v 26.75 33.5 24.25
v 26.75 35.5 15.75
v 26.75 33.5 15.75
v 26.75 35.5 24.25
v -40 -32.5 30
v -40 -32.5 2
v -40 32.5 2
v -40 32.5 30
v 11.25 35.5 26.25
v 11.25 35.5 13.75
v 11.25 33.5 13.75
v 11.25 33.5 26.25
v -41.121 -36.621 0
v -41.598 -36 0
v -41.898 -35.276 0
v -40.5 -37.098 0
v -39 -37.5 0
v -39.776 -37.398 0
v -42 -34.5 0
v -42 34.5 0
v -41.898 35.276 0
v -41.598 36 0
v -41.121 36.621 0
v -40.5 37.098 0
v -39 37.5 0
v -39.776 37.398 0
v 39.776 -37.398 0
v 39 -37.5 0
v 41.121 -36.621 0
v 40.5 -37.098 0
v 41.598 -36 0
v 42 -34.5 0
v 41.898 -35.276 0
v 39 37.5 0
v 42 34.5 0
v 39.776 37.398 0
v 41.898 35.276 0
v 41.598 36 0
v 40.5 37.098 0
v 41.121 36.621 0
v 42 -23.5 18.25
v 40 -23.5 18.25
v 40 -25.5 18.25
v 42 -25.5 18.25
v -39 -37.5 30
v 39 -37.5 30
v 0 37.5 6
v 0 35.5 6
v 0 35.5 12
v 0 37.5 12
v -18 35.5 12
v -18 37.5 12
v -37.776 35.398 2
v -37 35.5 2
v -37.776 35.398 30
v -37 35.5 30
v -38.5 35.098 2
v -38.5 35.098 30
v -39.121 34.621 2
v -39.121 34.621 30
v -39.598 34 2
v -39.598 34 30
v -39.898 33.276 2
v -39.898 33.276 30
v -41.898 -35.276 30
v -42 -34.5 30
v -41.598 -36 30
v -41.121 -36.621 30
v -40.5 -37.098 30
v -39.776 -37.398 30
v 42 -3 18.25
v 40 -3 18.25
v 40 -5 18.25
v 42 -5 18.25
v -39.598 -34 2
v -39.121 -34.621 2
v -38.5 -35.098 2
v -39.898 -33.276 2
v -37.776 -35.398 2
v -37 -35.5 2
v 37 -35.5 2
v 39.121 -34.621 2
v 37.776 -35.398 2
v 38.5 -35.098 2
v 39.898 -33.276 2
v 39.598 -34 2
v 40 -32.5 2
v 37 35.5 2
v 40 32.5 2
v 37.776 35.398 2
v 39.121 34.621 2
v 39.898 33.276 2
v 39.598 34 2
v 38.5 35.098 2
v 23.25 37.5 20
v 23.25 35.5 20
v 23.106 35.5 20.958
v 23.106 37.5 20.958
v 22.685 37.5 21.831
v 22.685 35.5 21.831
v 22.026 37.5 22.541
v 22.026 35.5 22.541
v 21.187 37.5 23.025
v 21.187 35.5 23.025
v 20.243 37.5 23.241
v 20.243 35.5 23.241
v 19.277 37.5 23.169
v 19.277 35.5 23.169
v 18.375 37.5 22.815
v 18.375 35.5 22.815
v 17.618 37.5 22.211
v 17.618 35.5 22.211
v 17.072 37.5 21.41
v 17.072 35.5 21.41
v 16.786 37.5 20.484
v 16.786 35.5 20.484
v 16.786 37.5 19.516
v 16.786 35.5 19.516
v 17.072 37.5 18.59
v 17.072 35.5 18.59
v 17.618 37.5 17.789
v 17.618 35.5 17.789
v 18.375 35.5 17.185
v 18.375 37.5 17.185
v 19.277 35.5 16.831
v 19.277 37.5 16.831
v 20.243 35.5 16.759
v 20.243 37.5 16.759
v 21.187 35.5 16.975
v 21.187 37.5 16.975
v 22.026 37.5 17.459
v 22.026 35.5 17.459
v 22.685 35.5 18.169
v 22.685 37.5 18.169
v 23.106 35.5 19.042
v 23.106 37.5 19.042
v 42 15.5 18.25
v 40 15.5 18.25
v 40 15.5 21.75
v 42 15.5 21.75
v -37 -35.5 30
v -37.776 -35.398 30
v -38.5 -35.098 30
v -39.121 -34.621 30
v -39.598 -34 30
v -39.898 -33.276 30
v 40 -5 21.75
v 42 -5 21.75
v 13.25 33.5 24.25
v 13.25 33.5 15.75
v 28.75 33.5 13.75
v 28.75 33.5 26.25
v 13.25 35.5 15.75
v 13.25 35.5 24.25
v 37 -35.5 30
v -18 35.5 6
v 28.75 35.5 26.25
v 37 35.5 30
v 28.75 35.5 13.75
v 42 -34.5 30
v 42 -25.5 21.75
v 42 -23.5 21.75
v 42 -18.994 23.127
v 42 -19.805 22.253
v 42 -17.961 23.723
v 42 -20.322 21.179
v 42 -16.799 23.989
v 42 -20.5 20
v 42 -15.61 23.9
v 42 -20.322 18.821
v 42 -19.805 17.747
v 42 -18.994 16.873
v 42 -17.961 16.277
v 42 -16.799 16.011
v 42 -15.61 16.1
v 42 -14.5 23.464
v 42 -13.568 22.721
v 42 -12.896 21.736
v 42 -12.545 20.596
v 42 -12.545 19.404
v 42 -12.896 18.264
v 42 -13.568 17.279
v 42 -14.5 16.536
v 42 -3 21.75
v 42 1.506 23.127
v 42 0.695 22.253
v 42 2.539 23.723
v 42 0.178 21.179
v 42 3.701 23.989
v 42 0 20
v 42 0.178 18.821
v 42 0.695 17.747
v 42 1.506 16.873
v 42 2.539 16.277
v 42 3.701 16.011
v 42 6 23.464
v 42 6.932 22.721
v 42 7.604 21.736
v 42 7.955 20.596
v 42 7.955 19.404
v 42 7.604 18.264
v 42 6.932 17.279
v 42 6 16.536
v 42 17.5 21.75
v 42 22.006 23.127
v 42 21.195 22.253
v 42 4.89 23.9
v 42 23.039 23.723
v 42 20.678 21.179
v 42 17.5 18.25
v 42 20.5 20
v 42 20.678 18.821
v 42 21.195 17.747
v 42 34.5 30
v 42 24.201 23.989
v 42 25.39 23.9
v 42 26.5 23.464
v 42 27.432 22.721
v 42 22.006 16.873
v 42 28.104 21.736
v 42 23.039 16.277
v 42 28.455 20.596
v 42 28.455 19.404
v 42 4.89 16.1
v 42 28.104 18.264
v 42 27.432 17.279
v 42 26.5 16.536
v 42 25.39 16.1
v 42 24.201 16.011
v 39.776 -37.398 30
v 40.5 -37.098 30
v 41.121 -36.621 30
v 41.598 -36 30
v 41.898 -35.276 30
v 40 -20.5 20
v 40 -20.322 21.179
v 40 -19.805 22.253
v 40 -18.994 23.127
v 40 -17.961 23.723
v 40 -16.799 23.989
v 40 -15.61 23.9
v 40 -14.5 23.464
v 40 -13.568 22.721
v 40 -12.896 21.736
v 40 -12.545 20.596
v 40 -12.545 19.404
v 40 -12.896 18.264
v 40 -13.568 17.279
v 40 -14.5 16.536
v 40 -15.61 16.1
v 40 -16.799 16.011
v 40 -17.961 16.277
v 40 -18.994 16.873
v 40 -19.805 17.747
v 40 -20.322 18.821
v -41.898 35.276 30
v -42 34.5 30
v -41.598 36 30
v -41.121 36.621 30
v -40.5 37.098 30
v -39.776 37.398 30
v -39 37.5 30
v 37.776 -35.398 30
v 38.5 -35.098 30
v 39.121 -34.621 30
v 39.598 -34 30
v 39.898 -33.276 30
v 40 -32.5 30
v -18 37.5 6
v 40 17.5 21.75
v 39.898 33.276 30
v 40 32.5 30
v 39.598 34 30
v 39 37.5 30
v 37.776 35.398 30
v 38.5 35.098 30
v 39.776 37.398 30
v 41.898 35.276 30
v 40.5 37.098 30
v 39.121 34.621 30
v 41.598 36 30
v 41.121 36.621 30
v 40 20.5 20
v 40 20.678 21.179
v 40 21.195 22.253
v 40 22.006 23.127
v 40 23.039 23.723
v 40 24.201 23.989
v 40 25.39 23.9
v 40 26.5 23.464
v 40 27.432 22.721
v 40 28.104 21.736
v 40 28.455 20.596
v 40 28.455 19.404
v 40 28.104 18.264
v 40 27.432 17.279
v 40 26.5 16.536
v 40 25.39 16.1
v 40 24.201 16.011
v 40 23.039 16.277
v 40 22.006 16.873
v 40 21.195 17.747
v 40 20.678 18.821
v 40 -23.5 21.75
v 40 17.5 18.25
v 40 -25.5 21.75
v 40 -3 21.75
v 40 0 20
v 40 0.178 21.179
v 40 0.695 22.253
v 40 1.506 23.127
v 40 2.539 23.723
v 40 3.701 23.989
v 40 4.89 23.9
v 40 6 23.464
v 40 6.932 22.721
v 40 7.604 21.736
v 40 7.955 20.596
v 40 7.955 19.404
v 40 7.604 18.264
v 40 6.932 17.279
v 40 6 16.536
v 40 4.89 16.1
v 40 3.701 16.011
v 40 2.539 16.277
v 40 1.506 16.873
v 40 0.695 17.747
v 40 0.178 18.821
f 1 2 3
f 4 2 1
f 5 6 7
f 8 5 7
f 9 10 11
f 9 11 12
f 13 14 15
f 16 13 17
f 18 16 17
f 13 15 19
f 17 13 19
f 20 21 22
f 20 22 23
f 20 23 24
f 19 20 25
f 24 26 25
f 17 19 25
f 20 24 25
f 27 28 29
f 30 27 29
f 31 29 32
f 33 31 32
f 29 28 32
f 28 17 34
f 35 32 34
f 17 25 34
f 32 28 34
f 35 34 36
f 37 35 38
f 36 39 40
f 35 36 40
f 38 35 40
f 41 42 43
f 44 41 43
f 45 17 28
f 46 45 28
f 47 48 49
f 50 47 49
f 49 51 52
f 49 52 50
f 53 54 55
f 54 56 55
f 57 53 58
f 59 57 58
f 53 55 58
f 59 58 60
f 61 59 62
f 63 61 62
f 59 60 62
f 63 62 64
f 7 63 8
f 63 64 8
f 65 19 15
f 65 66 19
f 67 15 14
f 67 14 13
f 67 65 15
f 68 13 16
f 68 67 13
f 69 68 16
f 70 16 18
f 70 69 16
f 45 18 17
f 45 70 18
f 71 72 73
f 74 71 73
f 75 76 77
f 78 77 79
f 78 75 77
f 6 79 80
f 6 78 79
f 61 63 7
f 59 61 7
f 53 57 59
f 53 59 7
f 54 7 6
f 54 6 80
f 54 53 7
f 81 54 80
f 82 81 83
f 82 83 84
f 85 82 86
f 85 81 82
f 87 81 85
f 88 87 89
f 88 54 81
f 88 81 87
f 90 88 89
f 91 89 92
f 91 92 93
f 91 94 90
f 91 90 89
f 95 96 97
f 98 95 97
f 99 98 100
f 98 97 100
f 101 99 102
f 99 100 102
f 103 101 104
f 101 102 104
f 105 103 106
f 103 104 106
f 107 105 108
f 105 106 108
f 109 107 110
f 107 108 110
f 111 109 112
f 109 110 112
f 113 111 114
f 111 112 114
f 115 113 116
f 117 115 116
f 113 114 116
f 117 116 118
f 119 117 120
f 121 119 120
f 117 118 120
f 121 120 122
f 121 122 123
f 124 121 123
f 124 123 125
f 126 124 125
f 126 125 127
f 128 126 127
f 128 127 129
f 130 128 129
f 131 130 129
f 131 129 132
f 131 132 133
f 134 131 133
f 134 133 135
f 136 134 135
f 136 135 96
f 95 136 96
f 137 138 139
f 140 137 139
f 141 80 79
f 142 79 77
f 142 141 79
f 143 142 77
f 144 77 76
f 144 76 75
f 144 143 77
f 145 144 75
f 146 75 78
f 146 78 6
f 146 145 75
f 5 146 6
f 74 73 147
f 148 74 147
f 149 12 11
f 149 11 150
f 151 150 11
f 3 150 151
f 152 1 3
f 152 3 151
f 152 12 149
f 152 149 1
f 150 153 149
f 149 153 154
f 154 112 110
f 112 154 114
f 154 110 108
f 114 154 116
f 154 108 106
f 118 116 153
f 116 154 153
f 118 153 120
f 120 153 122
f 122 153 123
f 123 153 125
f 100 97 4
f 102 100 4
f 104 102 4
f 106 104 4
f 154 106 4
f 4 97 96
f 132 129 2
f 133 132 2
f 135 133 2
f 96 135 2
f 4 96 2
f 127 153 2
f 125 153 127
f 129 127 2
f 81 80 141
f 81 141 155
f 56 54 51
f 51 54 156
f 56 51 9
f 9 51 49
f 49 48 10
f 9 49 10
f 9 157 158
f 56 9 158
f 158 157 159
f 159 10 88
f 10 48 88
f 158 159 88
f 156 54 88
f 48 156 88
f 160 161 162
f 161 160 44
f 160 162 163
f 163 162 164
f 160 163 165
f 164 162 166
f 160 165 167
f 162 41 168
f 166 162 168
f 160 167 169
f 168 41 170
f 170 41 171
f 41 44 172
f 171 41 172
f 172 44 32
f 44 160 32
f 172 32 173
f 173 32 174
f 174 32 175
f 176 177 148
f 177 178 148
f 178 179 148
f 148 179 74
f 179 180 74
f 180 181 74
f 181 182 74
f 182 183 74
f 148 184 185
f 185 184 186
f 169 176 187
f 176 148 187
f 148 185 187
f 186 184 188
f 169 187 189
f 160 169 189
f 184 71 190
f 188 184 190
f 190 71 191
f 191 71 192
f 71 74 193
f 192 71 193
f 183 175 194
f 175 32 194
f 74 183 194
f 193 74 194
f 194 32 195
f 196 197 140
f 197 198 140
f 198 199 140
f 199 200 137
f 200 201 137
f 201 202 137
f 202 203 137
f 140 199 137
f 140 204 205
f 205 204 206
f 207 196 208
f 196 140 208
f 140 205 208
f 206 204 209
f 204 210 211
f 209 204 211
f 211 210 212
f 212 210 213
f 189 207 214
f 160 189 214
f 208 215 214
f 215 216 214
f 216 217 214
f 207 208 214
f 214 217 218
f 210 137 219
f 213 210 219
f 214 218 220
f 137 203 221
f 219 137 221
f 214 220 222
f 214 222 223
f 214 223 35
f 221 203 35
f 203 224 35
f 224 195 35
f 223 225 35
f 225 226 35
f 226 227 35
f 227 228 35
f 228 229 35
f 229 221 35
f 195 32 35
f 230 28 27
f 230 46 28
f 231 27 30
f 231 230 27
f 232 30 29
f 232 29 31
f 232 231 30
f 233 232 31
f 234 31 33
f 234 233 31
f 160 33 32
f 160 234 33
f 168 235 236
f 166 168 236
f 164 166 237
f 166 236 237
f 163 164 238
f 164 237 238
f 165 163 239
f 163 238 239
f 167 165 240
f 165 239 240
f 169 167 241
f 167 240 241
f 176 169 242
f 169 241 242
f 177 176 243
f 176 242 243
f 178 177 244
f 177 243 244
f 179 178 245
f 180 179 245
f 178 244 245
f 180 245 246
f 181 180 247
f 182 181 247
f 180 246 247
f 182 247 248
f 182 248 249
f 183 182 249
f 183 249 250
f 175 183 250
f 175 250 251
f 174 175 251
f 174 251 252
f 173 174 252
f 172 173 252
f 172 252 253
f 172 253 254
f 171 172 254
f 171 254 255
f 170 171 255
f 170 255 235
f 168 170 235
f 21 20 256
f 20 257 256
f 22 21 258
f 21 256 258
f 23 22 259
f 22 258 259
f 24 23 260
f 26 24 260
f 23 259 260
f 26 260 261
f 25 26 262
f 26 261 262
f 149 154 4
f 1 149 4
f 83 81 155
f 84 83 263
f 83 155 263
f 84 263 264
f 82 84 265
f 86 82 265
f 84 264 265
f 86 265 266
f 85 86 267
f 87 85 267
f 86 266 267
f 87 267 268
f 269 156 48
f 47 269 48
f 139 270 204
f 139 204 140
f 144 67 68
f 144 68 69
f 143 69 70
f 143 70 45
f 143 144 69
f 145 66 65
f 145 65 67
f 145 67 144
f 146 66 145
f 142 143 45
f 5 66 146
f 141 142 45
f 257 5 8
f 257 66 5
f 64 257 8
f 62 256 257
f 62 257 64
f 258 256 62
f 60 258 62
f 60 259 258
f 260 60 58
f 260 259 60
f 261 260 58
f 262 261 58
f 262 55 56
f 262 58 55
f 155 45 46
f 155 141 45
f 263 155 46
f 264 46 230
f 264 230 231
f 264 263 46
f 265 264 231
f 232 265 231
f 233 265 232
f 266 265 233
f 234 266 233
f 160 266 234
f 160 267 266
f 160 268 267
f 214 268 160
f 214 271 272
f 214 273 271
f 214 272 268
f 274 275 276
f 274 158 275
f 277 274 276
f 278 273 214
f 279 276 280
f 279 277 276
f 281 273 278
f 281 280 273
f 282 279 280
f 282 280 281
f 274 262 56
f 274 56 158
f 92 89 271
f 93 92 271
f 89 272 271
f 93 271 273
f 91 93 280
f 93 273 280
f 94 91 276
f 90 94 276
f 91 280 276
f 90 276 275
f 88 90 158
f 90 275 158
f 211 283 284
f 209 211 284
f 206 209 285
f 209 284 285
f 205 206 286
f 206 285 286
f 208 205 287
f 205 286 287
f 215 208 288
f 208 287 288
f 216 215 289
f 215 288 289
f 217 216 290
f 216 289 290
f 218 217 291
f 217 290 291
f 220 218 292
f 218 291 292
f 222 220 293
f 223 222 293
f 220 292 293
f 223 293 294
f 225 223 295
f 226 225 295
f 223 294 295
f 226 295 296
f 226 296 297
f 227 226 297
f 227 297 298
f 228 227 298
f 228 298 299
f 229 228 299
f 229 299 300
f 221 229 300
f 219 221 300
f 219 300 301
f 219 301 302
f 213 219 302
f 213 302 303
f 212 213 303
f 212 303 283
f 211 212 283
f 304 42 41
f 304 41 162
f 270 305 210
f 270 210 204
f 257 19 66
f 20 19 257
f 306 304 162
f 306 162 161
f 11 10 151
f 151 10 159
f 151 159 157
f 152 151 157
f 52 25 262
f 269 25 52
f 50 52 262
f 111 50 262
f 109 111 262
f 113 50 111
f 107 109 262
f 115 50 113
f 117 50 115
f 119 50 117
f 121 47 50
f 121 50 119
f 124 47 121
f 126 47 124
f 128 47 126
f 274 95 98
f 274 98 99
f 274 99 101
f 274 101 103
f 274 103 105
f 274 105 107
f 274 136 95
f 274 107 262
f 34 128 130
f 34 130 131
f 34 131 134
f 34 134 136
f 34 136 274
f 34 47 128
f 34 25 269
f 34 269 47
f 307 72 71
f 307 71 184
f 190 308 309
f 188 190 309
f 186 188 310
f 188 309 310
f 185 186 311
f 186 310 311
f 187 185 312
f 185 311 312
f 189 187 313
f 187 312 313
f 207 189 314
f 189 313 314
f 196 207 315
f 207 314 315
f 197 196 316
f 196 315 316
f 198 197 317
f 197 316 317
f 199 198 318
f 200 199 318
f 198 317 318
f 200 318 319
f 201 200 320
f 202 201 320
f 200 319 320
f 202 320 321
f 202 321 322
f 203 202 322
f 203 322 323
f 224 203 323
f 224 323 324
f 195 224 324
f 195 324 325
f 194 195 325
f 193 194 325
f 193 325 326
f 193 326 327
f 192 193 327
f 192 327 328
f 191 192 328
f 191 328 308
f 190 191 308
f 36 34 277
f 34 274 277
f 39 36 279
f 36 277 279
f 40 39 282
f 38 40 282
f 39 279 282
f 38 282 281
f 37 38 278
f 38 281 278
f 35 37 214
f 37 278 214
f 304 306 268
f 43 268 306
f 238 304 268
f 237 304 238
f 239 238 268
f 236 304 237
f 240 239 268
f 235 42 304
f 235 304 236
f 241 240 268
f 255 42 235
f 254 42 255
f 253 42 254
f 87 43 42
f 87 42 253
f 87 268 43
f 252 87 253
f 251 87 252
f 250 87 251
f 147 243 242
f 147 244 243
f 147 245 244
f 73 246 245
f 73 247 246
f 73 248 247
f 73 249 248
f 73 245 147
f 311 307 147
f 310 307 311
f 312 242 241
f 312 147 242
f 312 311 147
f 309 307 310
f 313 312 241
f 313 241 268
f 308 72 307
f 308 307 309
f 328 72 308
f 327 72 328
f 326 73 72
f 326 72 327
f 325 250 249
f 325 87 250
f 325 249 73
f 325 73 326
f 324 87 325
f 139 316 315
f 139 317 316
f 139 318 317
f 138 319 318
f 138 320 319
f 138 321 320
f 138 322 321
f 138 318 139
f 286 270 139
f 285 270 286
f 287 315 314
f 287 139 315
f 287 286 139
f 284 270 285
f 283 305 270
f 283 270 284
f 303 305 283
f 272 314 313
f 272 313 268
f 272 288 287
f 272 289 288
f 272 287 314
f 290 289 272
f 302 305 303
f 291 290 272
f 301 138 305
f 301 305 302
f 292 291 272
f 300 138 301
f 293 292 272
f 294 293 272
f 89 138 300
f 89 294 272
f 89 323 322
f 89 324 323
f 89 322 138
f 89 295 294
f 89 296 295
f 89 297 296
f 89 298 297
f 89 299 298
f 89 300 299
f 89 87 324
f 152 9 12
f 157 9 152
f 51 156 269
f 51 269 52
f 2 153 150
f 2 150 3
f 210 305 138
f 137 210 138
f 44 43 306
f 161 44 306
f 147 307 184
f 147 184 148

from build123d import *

# Parameters (mm, degrees)
F0_W     = 80
F0_H     = 71
F1_DEPTH = 2
F0_W_2   = 84
F0_H_2   = 75
F2_DEPTH = 30
F3_R     = 4
F4_DEPTH = 25
F5_W     = 18
F5_H     = 6
F6_DEPTH = 25
F5_W_2   = 17.5
F5_H_2   = 12.5
F5_W_3   = 13.5
F5_H_3   = 8.5
F7_DEPTH = 2
F5_R     = 3.25
F8_DEPTH = 25
F3_W     = 2
F3_H     = 3.5
F9_DEPTH = 25
F10_R    = 3
F11_R    = 3


with BuildPart() as f1:
    # F0 (on Top) → F1 (new body)
    with BuildSketch(Plane.XY):
        Rectangle(F0_W, F0_H)
    extrude(amount=F1_DEPTH)

    # F0 (on Top) → F2 (join)
    with BuildSketch(Plane.XY):
        Rectangle(F0_W_2, F0_H_2)
        Rectangle(F0_W, F0_H, mode=Mode.SUBTRACT)
    extrude(amount=F2_DEPTH)

    # F3 (on face) → F4 (cut)
    with BuildSketch(Plane(origin=(40, 0, 0), x_dir=(0, -1, 0), z_dir=(-1, 0, 0))):
        with Locations((-24.5, 20)):
            Circle(F3_R)
        with Locations((-4, 20)):
            Circle(F3_R)
        with Locations((16.5, 20)):
            Circle(F3_R)
    extrude(amount=-F4_DEPTH, mode=Mode.SUBTRACT)

    # F5 (on face) → F6 (cut)
    with BuildSketch(Plane.XZ.offset(-35.5)):
        with Locations((-9, 9)):
            Rectangle(F5_W, F5_H)
    extrude(amount=-F6_DEPTH, mode=Mode.SUBTRACT)

    # F5 (on face) → F7 (join)
    with BuildSketch(Plane.XZ.offset(-35.5)):
        with Locations((20, 20)):
            Rectangle(F5_W_2, F5_H_2)
        with Locations((20, 20)):
            Rectangle(F5_W_3, F5_H_3, mode=Mode.SUBTRACT)
    extrude(amount=F7_DEPTH)

    # F5 (on face) → F8 (cut)
    with BuildSketch(Plane.XZ.offset(-35.5)):
        with Locations((20, 20)):
            Circle(F5_R)
    extrude(amount=-F8_DEPTH, mode=Mode.SUBTRACT)

    # F3 (on face) → F9 (cut)
    with BuildSketch(Plane(origin=(40, 0, 0), x_dir=(0, -1, 0), z_dir=(-1, 0, 0))):
        with Locations((-16.5, 20)):
            Rectangle(F3_W, F3_H)
        with Locations((4, 20)):
            Rectangle(F3_W, F3_H)
        with Locations((24.5, 20)):
            Rectangle(F3_W, F3_H)
    extrude(amount=-F9_DEPTH, mode=Mode.SUBTRACT)

    # F10
    f10_edges = [f1.edges().sort_by_distance(p)[0] for p in [
        (40, 35.5, 16),
        (-40, 35.5, 16),
        (-40, -35.5, 16),
        (40, -35.5, 16),
    ]]
    fillet(f10_edges, radius=F10_R)

    # F11
    f11_edges = [f1.edges().sort_by_distance(p)[0] for p in [
        (42, -37.5, 15),
        (42, 37.5, 15),
        (-42, -37.5, 15),
        (-42, 37.5, 15),
    ]]
    fillet(f11_edges, radius=F11_R)


solid = f1.part
